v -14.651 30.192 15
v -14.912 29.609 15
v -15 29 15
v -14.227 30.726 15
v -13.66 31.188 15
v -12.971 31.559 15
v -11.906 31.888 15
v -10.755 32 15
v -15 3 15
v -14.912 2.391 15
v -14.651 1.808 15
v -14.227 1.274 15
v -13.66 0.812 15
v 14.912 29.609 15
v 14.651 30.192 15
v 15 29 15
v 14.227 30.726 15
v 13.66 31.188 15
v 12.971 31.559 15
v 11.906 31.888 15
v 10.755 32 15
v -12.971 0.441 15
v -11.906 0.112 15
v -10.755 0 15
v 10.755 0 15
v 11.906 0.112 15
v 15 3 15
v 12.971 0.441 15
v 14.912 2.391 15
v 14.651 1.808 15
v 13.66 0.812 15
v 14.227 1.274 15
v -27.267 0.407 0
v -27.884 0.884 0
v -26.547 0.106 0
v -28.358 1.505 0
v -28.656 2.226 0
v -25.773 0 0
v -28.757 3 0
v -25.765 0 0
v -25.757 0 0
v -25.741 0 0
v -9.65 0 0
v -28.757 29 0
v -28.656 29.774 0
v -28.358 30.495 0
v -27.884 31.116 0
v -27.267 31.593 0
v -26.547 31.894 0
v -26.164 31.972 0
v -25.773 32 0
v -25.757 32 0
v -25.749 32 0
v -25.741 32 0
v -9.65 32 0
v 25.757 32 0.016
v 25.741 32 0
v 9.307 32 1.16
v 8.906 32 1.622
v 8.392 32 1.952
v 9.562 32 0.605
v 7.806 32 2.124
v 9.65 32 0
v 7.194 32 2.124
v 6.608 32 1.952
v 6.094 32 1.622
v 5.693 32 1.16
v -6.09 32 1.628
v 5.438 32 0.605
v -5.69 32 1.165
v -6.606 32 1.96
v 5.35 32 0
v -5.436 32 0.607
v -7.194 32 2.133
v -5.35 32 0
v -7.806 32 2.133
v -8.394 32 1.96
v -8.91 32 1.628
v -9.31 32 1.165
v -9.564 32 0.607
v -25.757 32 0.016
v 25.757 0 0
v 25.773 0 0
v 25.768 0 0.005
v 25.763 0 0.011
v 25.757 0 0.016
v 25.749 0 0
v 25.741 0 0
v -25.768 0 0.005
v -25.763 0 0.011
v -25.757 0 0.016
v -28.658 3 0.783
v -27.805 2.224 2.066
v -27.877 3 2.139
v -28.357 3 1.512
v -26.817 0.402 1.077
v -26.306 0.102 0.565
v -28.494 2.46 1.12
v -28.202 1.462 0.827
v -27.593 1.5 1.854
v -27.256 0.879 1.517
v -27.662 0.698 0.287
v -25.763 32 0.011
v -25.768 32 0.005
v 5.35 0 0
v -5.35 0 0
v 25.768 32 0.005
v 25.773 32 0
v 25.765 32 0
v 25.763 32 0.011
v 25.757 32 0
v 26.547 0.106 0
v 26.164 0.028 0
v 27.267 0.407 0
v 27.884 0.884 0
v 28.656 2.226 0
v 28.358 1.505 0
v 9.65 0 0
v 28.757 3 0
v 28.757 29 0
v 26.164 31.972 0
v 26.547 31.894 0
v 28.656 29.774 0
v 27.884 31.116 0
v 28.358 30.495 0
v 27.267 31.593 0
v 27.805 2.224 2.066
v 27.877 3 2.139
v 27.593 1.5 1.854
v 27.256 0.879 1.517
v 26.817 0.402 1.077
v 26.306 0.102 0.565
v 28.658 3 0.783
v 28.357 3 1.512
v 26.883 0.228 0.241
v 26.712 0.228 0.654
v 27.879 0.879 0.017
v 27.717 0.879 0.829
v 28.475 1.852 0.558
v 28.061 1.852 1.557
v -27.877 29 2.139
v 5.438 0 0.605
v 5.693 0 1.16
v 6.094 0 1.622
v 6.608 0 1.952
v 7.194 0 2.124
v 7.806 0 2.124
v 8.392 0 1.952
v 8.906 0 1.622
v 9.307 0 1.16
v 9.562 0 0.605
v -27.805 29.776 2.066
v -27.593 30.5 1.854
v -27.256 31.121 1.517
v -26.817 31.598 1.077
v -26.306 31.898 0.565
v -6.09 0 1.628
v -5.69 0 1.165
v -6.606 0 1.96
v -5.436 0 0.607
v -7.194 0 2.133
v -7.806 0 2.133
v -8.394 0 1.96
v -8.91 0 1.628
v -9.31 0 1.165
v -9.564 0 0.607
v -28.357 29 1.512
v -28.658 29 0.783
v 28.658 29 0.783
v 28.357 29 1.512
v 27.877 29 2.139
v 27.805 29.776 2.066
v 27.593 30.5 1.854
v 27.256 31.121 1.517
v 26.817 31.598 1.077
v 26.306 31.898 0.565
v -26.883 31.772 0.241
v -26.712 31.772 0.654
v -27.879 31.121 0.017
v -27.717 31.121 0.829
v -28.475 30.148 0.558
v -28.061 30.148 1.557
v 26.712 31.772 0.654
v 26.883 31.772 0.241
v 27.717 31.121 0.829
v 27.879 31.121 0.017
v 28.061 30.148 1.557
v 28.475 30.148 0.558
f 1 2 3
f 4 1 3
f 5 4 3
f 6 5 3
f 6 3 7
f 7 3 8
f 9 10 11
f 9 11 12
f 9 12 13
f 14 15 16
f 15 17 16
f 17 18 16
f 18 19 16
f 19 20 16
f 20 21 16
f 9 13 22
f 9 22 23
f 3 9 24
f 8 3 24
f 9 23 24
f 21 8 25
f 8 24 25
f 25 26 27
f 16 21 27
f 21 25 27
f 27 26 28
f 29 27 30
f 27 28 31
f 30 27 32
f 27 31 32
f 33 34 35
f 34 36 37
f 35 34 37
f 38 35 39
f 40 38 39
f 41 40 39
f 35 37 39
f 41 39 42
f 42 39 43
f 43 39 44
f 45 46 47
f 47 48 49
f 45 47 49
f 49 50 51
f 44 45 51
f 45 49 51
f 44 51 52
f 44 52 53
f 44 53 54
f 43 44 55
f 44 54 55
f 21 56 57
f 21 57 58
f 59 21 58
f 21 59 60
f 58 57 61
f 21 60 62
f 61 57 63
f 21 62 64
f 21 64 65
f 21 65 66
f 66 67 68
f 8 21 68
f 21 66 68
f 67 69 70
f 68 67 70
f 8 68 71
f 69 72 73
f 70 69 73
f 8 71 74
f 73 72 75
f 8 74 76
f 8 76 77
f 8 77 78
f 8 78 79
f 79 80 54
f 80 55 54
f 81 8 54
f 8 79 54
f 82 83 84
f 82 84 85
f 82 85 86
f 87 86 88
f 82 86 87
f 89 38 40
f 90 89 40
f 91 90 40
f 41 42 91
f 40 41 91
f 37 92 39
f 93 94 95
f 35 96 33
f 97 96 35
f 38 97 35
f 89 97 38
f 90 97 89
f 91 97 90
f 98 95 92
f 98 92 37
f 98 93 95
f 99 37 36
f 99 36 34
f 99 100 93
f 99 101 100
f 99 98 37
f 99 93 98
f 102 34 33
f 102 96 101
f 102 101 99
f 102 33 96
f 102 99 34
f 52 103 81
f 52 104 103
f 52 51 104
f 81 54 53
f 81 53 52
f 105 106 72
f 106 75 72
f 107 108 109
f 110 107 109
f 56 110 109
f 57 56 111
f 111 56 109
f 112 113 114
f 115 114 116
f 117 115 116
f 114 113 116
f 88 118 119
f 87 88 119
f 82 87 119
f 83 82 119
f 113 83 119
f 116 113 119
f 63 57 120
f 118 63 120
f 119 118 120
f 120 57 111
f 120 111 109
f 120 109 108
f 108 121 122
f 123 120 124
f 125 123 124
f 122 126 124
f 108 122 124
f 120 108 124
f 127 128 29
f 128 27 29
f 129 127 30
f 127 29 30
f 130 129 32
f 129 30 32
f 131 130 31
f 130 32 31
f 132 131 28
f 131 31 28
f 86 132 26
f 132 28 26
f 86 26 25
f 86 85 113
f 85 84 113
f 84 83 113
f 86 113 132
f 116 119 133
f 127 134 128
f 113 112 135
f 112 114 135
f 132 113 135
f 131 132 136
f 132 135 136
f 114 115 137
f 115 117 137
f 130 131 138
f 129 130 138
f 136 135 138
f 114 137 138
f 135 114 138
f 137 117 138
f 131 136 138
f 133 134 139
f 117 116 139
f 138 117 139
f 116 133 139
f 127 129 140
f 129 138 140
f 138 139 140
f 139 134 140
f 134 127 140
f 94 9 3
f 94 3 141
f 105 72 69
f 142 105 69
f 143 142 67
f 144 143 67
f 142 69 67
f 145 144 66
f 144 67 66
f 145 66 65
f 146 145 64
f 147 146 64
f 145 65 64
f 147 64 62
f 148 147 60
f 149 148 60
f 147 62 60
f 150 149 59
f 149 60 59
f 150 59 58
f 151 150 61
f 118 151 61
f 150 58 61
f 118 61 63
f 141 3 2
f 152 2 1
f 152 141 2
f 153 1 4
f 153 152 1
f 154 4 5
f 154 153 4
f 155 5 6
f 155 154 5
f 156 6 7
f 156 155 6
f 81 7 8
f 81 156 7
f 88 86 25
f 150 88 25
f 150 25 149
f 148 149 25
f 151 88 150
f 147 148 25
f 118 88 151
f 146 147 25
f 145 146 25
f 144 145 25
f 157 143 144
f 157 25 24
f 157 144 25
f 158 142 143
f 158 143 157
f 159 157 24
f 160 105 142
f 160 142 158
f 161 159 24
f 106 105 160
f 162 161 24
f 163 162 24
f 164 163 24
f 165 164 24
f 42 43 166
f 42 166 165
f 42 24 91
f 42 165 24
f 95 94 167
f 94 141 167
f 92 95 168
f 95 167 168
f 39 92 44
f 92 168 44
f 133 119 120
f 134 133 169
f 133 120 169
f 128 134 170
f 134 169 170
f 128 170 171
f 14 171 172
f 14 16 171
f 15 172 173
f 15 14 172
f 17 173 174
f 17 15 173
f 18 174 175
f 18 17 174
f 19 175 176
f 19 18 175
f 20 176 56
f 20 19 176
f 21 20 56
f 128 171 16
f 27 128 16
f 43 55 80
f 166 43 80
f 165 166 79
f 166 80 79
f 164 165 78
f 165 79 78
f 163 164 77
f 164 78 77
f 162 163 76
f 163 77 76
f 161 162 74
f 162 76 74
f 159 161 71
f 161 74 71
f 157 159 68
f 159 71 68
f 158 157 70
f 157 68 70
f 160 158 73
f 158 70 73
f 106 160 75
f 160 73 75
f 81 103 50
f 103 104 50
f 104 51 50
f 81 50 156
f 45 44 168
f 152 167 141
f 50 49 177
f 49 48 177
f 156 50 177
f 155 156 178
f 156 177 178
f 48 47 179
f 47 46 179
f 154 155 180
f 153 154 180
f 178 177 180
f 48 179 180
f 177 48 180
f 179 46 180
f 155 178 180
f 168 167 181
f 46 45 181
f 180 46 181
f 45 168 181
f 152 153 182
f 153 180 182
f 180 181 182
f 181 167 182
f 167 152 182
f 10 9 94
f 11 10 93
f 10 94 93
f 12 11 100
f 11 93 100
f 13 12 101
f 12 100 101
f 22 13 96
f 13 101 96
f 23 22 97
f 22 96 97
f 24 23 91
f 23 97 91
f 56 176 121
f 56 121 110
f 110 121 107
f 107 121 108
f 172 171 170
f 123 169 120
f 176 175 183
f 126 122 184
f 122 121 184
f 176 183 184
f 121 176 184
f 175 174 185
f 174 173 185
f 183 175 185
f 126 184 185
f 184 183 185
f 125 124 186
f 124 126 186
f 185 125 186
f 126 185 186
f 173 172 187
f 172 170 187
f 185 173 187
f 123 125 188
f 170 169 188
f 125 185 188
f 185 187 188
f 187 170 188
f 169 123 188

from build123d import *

# Parameters (mm, degrees)
SKETCH1_W           = 30
SKETCH1_H           = 30.000023288
BOSS_EXTRUDE2_DEPTH = 32
FILLET1_R           = 3
SKETCH3_R           = 2.15
CUT_EXTRUDE1_DEPTH  = 63
SKETCH5_W           = 78.057106385
SKETCH5_H           = 38.470116024
CUT_EXTRUDE2_DEPTH  = 63


with BuildPart() as part:
    # Sketch1 → Boss-Extrude2 (new body)
    with BuildSketch(Plane(origin=(0, 0, 0), x_dir=(1, 0, 0), z_dir=(0, 1, 0))):
        Polygon((-15, 15.000011644), (-15, -15.000011644), (-30, -0.01868994), align=None)
        Rectangle(SKETCH1_W, SKETCH1_H)
        Polygon((30, -0.01868994), (15, -15.000011644), (15, 15.000011644), align=None)
    extrude(amount=BOSS_EXTRUDE2_DEPTH)

    # Fillet1
    fillet1_edges = [part.edges().sort_by_distance(p)[0] for p in [
        (-22.5, 0, 7.509350792),
        (-30, 16, 0.01868994),
        (30, 16, 0.01868994),
        (22.5, 32, 7.509350792),
        (22.5, 32, -7.490660852),
        (-22.5, 32, -7.490660852),
        (-22.5, 32, 7.509350792),
        (-22.5, 0, -7.490660852),
        (22.5, 0, -7.490660852),
        (22.5, 0, 7.509350792),
    ]]
    fillet(fillet1_edges, radius=FILLET1_R)

    # Sketch3 → Cut-Extrude1 (cut)
    with BuildSketch(Plane(origin=(0, 32, 0), x_dir=(1, 0, 0), z_dir=(0, 1, 0))):
        with Locations(Location((-7.499998545, -0.004672484, 0), (0, 0, 270))):
            Circle(SKETCH3_R)
        with Locations(Location((7.5, 0.004672485, 0), (0, 0, 270))):
            Circle(SKETCH3_R)
    extrude(amount=-CUT_EXTRUDE1_DEPTH, mode=Mode.SUBTRACT)

    # Sketch5 → Cut-Extrude2 (cut)
    with BuildSketch(Plane.XY):
        with Locations((3.040380137, 18.388870108)):
            Rectangle(SKETCH5_W, SKETCH5_H)
    extrude(amount=-CUT_EXTRUDE2_DEPTH, mode=Mode.SUBTRACT)


solid = part.part
